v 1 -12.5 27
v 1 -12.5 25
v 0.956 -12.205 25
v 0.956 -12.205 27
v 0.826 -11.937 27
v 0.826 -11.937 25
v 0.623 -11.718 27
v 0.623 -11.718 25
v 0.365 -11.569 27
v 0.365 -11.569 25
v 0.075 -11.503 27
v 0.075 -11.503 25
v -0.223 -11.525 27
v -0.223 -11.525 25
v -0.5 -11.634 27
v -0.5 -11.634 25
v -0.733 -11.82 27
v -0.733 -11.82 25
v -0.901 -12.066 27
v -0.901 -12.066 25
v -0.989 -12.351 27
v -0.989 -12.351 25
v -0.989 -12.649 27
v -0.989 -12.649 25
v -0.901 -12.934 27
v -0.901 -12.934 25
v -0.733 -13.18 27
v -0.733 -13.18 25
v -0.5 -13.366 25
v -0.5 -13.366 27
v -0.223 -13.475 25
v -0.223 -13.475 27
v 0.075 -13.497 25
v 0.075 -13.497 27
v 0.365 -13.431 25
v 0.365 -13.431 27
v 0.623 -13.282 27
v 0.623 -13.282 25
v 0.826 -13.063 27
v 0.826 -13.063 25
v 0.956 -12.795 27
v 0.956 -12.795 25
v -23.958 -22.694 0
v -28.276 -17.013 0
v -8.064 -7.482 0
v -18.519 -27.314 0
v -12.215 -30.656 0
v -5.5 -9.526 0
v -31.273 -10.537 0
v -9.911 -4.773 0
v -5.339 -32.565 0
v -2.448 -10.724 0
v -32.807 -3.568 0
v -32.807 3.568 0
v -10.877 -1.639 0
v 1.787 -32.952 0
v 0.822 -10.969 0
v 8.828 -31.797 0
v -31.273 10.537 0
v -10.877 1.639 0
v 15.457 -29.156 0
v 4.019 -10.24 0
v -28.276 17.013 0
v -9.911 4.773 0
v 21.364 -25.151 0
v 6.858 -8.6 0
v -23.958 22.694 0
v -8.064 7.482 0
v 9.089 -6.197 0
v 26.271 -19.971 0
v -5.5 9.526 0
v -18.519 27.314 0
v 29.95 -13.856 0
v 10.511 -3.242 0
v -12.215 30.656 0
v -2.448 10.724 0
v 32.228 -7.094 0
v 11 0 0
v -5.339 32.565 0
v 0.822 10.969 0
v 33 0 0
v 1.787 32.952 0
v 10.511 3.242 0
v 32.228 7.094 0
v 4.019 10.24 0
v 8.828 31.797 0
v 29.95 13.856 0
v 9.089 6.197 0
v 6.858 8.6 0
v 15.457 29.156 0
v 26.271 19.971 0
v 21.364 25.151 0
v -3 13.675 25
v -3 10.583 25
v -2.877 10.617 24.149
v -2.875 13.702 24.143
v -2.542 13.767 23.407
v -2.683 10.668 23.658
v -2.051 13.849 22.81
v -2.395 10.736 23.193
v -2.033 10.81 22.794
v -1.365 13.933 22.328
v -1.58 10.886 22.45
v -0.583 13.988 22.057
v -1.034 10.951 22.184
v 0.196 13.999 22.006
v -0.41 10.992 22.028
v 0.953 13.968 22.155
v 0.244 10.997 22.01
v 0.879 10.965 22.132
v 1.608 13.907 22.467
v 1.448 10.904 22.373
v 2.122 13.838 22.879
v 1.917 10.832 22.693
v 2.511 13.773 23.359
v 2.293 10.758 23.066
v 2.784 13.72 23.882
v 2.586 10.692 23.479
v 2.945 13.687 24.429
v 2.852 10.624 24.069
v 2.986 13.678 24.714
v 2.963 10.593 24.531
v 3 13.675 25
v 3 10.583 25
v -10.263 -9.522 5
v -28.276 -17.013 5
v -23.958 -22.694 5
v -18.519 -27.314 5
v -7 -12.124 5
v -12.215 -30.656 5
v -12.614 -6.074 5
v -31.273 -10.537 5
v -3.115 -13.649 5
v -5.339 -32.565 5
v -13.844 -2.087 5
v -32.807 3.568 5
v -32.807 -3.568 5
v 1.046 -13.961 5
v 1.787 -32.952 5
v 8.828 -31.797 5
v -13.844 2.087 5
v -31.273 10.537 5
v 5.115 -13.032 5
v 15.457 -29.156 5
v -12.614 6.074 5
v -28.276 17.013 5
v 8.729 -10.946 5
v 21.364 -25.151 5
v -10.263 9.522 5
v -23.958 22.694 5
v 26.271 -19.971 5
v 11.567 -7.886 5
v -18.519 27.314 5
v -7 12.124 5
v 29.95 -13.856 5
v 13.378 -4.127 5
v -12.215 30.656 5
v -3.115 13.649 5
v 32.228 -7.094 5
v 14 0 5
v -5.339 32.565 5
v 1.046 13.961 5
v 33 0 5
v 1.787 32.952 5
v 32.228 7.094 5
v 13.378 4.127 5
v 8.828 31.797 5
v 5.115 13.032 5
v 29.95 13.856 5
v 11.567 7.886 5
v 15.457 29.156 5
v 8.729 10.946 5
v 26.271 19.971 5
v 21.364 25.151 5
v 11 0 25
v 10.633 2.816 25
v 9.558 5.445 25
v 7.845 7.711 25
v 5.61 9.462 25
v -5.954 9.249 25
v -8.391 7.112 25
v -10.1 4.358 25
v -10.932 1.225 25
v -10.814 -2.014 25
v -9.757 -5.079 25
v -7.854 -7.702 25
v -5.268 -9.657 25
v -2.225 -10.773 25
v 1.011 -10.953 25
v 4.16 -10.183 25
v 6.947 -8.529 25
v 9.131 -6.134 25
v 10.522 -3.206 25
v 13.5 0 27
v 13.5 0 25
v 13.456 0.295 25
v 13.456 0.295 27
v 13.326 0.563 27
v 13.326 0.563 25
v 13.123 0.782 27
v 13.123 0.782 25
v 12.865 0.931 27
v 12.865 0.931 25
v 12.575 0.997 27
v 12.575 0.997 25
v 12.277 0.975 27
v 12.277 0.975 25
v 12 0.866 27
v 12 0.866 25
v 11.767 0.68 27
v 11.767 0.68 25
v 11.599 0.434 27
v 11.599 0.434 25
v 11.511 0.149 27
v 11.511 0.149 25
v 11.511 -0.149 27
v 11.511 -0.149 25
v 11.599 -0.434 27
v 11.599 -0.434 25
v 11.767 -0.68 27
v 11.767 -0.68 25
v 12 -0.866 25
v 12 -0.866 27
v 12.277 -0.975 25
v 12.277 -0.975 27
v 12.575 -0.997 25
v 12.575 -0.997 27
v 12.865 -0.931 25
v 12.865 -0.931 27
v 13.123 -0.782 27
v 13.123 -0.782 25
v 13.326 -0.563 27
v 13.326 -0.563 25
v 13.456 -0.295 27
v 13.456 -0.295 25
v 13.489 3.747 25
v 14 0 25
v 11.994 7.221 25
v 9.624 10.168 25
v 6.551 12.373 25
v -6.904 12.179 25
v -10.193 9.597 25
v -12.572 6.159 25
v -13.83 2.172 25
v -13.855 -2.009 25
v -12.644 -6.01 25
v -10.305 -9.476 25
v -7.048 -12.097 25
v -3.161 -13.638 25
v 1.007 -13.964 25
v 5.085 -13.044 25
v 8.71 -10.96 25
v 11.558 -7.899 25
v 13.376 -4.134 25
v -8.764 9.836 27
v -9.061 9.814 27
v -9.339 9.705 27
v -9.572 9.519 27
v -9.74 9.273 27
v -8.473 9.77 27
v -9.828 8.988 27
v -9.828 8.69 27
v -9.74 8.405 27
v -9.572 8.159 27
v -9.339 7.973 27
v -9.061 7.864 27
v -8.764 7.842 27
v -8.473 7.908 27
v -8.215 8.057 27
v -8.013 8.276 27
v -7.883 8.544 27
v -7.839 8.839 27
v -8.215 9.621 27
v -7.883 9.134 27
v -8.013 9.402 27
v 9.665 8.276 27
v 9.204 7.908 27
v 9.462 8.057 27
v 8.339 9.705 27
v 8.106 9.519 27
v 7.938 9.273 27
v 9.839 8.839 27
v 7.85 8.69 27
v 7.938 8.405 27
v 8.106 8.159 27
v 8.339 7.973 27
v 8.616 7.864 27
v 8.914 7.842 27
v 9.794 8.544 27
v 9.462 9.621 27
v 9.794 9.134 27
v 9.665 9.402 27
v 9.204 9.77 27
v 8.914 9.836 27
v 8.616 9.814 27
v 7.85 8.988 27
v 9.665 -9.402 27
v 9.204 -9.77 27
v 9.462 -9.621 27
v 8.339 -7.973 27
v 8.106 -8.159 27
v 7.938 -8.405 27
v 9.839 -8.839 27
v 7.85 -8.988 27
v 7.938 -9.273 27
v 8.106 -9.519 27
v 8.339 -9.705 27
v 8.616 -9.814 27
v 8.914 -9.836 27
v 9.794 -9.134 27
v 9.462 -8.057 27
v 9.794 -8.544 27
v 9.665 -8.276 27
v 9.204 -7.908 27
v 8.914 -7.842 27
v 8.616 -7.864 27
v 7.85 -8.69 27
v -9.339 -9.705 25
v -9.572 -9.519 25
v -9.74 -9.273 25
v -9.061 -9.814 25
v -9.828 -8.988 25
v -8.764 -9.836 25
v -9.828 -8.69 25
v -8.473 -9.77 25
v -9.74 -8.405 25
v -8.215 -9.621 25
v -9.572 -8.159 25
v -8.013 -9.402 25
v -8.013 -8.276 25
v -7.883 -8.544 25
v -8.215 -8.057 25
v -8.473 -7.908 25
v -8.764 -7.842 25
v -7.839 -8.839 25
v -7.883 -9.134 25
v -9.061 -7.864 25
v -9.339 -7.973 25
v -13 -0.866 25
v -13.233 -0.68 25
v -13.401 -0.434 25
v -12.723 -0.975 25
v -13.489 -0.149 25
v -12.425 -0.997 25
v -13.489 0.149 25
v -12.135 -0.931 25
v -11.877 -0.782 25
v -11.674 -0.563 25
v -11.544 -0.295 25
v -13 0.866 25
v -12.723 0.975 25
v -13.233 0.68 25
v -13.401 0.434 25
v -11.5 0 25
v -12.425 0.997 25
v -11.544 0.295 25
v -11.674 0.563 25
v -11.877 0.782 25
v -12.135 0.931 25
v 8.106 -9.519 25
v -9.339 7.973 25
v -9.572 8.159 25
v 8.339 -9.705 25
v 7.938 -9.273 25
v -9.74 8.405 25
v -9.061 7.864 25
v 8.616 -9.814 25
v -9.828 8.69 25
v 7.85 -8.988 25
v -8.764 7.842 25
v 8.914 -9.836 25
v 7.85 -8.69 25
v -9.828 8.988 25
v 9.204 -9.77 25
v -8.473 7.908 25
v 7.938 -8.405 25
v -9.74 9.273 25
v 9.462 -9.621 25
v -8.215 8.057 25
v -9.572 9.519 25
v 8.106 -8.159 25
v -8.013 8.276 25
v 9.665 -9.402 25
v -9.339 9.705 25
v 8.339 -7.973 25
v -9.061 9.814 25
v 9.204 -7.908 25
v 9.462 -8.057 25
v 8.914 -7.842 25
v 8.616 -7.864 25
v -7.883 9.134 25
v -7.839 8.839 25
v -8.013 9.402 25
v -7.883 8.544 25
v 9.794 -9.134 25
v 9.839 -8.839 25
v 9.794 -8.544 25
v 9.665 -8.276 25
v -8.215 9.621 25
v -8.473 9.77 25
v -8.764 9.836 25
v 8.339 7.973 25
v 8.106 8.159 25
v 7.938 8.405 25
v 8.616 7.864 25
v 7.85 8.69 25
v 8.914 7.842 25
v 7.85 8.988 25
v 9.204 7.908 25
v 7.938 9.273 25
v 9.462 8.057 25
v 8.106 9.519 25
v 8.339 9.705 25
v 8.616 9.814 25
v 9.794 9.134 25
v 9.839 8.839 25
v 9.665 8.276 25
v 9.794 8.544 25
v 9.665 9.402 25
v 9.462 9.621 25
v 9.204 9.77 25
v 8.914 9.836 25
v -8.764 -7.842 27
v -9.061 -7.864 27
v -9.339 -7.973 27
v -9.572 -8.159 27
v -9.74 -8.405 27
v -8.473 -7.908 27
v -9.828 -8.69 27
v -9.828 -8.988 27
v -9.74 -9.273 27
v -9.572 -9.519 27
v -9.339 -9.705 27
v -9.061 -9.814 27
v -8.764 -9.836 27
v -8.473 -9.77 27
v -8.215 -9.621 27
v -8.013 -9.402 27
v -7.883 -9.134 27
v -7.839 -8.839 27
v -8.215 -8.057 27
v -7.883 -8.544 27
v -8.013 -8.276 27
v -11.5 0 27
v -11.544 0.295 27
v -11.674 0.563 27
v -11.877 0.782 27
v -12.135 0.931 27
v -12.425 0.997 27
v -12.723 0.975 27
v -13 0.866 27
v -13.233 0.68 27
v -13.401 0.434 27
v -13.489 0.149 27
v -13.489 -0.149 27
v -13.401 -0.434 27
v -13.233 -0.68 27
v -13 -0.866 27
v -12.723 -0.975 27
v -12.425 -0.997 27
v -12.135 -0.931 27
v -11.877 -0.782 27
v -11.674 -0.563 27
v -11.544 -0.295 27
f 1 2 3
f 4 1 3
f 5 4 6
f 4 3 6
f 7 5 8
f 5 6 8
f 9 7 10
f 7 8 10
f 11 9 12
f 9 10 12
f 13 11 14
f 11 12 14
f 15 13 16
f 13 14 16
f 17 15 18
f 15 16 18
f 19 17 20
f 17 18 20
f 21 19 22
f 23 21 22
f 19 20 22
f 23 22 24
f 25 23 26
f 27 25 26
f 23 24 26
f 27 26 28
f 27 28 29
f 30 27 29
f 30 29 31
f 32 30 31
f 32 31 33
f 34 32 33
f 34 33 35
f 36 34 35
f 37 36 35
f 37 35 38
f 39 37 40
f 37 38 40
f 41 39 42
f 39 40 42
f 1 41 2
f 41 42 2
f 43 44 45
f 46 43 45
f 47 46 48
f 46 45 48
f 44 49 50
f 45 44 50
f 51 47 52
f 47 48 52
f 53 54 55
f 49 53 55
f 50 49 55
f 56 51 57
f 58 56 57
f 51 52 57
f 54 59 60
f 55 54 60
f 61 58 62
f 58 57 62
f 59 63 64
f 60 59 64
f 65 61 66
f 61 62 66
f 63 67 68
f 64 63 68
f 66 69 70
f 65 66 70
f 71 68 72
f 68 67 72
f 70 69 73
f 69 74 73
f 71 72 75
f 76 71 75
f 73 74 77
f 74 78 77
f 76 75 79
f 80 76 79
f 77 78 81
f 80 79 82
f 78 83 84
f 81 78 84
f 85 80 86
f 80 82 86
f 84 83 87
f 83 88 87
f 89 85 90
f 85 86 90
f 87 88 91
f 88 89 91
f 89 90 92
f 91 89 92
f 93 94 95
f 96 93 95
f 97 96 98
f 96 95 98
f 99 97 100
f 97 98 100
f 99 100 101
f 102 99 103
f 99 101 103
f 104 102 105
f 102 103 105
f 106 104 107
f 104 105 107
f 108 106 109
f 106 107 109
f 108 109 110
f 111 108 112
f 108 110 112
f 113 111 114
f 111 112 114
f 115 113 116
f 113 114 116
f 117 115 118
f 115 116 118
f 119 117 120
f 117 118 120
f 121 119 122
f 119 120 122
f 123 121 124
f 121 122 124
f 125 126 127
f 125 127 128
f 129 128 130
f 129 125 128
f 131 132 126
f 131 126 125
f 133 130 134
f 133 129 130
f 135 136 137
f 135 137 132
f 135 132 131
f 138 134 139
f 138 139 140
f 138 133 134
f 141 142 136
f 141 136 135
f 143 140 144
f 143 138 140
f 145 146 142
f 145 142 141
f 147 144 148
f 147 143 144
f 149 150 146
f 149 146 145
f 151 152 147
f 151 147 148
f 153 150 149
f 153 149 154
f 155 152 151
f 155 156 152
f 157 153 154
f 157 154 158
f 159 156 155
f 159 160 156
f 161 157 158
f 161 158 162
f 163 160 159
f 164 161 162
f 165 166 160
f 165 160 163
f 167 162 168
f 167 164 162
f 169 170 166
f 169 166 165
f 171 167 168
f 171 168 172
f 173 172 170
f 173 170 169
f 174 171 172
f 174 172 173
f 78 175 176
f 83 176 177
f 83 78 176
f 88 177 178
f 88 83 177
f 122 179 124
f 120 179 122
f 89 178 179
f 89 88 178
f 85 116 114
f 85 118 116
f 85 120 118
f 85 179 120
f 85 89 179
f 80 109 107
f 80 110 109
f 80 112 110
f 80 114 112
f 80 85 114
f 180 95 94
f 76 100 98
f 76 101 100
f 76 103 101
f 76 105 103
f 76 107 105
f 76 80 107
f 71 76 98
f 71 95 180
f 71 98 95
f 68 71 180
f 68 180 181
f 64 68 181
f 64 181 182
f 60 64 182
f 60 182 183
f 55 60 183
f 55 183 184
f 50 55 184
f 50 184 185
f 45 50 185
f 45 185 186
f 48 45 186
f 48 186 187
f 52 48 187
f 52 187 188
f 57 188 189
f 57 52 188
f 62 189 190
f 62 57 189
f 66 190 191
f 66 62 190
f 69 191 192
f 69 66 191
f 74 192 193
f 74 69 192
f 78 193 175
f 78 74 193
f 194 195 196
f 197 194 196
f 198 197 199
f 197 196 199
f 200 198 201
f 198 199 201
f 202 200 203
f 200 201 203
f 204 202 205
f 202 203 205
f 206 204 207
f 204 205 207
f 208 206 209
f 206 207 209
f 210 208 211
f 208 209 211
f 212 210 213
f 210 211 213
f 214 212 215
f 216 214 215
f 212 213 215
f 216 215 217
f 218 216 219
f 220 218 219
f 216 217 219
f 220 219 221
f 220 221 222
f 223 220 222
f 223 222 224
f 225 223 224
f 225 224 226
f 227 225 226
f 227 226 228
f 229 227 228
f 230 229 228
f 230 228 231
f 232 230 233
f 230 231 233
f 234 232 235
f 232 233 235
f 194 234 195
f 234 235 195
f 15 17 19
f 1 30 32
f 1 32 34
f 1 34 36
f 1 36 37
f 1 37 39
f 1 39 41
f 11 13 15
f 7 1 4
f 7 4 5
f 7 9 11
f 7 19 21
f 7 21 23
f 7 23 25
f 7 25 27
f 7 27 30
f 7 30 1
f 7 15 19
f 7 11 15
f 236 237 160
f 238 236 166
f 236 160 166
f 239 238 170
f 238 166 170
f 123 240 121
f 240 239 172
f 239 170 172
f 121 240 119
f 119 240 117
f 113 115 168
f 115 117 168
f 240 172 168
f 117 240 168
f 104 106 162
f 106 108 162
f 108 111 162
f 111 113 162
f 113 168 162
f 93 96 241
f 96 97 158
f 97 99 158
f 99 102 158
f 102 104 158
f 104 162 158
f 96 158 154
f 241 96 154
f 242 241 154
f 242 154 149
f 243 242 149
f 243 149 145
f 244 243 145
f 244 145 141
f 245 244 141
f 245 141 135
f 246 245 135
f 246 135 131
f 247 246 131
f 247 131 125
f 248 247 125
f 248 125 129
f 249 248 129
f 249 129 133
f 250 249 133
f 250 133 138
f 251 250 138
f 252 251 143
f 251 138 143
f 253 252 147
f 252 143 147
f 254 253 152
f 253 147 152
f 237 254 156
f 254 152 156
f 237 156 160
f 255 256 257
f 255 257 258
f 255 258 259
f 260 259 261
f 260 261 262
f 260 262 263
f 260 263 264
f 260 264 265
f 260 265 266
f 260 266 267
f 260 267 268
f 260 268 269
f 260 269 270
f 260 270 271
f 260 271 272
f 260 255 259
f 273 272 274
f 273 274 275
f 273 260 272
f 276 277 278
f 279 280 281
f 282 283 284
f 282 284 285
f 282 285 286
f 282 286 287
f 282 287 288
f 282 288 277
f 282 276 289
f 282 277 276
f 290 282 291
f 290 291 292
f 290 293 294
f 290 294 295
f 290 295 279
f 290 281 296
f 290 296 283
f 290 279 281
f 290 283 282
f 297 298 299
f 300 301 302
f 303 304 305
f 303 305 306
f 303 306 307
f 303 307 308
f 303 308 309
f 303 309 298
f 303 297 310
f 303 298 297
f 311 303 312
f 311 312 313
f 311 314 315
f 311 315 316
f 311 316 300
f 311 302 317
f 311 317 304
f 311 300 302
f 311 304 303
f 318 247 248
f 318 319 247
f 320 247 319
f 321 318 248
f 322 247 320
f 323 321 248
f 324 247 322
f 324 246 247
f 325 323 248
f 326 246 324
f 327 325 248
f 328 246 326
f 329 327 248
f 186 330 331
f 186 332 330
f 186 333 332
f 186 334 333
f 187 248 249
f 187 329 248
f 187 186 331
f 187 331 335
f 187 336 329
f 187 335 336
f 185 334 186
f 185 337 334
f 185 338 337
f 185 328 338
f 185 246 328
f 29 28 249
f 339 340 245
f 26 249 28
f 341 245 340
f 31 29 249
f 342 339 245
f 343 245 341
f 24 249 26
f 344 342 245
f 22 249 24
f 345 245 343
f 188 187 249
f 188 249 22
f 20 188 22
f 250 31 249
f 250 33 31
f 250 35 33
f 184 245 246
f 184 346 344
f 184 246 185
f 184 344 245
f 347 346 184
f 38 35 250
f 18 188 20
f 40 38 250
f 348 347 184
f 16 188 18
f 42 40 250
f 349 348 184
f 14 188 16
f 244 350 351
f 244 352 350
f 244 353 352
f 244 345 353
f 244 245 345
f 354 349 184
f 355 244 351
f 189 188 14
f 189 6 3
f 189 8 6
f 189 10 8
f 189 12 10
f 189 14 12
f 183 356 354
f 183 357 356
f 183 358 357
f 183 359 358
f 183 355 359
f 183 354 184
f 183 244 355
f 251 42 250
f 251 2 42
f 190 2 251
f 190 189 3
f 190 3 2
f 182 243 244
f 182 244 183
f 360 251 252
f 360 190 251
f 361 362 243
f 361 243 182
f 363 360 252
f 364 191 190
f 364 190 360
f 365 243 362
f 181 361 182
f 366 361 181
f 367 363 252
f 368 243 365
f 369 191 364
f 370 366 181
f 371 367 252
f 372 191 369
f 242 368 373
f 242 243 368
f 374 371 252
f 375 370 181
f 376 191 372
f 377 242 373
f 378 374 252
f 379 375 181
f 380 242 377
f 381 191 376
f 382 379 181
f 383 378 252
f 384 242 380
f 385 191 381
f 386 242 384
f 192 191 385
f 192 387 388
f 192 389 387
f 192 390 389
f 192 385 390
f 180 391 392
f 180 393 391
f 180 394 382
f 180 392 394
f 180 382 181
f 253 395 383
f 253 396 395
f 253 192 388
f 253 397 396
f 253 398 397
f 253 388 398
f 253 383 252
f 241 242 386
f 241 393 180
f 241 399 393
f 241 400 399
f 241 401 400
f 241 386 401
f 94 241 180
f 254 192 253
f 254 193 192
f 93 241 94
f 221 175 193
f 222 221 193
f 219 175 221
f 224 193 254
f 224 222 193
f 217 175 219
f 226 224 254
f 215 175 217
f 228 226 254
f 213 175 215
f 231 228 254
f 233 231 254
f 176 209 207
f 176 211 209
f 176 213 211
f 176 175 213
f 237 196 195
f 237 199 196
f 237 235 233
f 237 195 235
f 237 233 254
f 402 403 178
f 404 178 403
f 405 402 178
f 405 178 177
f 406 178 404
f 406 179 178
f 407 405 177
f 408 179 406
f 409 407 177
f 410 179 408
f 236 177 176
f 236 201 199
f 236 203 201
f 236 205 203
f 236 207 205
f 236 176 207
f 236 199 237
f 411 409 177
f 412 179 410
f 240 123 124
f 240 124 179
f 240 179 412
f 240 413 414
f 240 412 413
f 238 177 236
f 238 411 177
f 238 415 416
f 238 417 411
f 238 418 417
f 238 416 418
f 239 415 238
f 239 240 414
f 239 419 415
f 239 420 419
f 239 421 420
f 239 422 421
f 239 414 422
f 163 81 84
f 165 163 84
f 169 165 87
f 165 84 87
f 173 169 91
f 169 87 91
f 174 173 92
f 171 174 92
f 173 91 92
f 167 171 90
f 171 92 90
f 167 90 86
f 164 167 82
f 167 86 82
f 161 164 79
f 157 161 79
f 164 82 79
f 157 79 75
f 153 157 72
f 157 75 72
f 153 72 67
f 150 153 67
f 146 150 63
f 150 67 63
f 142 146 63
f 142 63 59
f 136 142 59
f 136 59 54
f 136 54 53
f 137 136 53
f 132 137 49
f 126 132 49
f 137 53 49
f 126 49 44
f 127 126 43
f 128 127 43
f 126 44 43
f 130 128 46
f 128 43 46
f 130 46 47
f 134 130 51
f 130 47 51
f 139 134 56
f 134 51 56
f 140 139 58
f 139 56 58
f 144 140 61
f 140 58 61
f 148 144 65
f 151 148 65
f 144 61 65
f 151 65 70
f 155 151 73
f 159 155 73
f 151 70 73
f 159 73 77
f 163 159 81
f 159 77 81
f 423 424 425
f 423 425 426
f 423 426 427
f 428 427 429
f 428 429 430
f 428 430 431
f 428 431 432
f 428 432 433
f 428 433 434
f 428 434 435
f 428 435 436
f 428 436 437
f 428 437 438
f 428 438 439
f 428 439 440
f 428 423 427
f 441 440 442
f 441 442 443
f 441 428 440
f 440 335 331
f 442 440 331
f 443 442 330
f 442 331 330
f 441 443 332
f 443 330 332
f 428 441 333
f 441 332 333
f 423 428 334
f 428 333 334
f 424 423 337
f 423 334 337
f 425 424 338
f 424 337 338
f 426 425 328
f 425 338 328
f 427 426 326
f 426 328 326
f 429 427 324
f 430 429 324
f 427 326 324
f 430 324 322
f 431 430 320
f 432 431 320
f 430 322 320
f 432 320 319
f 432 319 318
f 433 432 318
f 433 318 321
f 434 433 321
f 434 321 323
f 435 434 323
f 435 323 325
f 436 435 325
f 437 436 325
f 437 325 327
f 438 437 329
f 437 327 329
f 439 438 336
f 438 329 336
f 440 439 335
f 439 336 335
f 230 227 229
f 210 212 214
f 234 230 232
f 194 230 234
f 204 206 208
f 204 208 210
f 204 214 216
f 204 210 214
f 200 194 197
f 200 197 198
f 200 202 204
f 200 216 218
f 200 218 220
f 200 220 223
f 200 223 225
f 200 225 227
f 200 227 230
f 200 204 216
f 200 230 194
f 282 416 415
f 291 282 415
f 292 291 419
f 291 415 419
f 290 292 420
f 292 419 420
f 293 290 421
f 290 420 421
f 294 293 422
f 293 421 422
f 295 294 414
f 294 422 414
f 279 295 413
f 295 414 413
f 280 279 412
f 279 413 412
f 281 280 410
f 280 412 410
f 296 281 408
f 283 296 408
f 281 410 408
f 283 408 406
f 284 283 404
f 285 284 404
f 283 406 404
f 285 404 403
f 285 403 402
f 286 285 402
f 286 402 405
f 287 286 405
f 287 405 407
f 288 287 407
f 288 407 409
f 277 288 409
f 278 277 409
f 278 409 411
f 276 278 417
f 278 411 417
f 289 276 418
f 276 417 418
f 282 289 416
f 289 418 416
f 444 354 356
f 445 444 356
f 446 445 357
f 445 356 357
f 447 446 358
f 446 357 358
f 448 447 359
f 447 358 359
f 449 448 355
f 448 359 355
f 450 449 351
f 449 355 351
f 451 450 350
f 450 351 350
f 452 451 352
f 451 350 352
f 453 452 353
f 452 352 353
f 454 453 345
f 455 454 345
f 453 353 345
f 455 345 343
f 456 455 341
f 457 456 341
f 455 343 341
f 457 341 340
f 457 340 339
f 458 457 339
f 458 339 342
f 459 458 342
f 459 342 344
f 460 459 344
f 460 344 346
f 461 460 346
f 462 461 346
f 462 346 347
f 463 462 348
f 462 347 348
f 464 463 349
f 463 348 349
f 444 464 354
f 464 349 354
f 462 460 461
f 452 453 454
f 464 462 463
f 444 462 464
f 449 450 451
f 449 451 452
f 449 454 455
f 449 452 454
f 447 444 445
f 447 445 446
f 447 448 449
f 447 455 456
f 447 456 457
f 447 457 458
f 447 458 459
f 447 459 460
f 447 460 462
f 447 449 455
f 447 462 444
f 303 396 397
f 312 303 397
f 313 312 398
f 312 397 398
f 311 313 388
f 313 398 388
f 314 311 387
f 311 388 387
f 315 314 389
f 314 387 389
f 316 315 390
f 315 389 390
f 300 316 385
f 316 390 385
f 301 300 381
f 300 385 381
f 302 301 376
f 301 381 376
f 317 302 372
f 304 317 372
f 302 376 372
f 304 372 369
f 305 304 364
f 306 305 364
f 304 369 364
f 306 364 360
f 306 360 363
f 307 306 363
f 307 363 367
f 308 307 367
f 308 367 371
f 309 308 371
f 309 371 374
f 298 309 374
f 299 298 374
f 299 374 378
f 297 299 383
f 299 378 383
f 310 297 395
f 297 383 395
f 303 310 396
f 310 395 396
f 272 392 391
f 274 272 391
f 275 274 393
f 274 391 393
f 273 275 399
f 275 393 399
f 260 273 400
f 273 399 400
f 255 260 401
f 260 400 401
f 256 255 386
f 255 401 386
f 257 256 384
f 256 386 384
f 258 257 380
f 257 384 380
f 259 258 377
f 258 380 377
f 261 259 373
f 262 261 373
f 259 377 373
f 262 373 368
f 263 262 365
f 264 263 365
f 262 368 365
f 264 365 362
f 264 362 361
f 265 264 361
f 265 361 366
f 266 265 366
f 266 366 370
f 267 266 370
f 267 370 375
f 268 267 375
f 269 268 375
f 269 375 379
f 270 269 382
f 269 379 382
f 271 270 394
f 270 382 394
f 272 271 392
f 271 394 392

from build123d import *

# Parameters (mm, degrees)
F0_R     = 14
F0_R_2   = 11
F1_DEPTH = 25
F0_R_3   = 33
F2_DEPTH = 5
F3_R     = 3
F4_DEPTH = 25
F6_R     = 1
F7_DEPTH = 2


with BuildPart() as f1:
    # F0 (on Top) → F1 (new body)
    with BuildSketch(Plane.XY):
        Circle(F0_R)
        Circle(F0_R_2, mode=Mode.SUBTRACT)
    extrude(amount=F1_DEPTH)

    # F0 (on Top) → F2 (join)
    with BuildSketch(Plane.XY):
        Circle(F0_R_3)
        Circle(F0_R, mode=Mode.SUBTRACT)
    extrude(amount=F2_DEPTH)

    # F3 (on Front) → F4 (cut)
    with BuildSketch(Plane.XZ):
        with Locations((0, 25)):
            Circle(F3_R)
    extrude(amount=-F4_DEPTH, mode=Mode.SUBTRACT)

    # F6 (on offset) → F7 (join)
    with BuildSketch(Plane.XY.offset(25)):
        with Locations((-8.8388347648, 8.8388347648)):
            Circle(F6_R)
        with Locations((8.8388347648, 8.8388347648)):
            Circle(F6_R)
        with Locations((12.5, 0)):
            Circle(F6_R)
        with Locations((8.8388347648, -8.8388347648)):
            Circle(F6_R)
        with Locations((0, -12.5)):
            Circle(F6_R)
        with Locations((-8.8388347648, -8.8388347648)):
            Circle(F6_R)
        with Locations((-12.5, 0)):
            Circle(F6_R)
    extrude(amount=F7_DEPTH)


solid = f1.part
